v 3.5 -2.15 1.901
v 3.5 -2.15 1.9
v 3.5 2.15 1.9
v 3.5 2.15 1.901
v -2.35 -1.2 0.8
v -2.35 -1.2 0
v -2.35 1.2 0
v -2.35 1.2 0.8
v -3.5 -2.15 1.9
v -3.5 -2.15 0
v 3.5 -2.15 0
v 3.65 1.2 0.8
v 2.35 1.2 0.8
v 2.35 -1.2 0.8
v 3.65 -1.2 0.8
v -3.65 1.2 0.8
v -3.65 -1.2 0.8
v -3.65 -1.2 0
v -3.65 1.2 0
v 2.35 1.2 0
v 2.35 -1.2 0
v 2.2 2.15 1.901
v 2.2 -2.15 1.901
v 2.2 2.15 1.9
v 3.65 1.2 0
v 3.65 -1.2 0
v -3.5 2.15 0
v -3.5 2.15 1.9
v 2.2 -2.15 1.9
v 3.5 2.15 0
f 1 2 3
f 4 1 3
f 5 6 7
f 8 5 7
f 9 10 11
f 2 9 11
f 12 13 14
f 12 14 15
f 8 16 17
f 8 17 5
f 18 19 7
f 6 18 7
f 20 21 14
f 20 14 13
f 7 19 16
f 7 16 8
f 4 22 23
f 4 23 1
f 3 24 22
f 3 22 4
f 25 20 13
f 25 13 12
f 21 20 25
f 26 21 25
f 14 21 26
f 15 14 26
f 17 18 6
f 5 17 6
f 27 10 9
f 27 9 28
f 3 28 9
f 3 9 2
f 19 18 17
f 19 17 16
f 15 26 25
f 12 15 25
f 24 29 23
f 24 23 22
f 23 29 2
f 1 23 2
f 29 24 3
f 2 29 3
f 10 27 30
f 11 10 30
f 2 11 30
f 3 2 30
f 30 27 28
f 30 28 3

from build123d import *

# Parameters (mm, degrees)
F0_W     = 1.3
F0_H     = 2.4
F1_DEPTH = 0.8
F2_W     = 7
F2_H     = 4.3
F3_DEPTH = 1.9
F4_W     = 1.3
F4_H     = 4.3
F5_DEPTH = 0.001


with BuildPart() as f1:
    # F0 (on Top) → F1 (new body)
    with BuildSketch(Plane.XY):
        with Locations((-3, 0)):
            Rectangle(F0_W, F0_H)
        with Locations((3, 0)):
            Rectangle(F0_W, F0_H)
    extrude(amount=F1_DEPTH)


with BuildPart() as f3:
    # F2 (on Top) → F3 (new body)
    with BuildSketch(Plane.XY):
        Rectangle(F2_W, F2_H)
    extrude(amount=F3_DEPTH)


with BuildPart() as f5:
    # F4 (on face) → F5 (new body)
    with BuildSketch(Plane.XY.offset(1.9)):
        with Locations((2.85, 0)):
            Rectangle(F4_W, F4_H)
    extrude(amount=F5_DEPTH)


solid = Compound([f1.part, f3.part, f5.part])
